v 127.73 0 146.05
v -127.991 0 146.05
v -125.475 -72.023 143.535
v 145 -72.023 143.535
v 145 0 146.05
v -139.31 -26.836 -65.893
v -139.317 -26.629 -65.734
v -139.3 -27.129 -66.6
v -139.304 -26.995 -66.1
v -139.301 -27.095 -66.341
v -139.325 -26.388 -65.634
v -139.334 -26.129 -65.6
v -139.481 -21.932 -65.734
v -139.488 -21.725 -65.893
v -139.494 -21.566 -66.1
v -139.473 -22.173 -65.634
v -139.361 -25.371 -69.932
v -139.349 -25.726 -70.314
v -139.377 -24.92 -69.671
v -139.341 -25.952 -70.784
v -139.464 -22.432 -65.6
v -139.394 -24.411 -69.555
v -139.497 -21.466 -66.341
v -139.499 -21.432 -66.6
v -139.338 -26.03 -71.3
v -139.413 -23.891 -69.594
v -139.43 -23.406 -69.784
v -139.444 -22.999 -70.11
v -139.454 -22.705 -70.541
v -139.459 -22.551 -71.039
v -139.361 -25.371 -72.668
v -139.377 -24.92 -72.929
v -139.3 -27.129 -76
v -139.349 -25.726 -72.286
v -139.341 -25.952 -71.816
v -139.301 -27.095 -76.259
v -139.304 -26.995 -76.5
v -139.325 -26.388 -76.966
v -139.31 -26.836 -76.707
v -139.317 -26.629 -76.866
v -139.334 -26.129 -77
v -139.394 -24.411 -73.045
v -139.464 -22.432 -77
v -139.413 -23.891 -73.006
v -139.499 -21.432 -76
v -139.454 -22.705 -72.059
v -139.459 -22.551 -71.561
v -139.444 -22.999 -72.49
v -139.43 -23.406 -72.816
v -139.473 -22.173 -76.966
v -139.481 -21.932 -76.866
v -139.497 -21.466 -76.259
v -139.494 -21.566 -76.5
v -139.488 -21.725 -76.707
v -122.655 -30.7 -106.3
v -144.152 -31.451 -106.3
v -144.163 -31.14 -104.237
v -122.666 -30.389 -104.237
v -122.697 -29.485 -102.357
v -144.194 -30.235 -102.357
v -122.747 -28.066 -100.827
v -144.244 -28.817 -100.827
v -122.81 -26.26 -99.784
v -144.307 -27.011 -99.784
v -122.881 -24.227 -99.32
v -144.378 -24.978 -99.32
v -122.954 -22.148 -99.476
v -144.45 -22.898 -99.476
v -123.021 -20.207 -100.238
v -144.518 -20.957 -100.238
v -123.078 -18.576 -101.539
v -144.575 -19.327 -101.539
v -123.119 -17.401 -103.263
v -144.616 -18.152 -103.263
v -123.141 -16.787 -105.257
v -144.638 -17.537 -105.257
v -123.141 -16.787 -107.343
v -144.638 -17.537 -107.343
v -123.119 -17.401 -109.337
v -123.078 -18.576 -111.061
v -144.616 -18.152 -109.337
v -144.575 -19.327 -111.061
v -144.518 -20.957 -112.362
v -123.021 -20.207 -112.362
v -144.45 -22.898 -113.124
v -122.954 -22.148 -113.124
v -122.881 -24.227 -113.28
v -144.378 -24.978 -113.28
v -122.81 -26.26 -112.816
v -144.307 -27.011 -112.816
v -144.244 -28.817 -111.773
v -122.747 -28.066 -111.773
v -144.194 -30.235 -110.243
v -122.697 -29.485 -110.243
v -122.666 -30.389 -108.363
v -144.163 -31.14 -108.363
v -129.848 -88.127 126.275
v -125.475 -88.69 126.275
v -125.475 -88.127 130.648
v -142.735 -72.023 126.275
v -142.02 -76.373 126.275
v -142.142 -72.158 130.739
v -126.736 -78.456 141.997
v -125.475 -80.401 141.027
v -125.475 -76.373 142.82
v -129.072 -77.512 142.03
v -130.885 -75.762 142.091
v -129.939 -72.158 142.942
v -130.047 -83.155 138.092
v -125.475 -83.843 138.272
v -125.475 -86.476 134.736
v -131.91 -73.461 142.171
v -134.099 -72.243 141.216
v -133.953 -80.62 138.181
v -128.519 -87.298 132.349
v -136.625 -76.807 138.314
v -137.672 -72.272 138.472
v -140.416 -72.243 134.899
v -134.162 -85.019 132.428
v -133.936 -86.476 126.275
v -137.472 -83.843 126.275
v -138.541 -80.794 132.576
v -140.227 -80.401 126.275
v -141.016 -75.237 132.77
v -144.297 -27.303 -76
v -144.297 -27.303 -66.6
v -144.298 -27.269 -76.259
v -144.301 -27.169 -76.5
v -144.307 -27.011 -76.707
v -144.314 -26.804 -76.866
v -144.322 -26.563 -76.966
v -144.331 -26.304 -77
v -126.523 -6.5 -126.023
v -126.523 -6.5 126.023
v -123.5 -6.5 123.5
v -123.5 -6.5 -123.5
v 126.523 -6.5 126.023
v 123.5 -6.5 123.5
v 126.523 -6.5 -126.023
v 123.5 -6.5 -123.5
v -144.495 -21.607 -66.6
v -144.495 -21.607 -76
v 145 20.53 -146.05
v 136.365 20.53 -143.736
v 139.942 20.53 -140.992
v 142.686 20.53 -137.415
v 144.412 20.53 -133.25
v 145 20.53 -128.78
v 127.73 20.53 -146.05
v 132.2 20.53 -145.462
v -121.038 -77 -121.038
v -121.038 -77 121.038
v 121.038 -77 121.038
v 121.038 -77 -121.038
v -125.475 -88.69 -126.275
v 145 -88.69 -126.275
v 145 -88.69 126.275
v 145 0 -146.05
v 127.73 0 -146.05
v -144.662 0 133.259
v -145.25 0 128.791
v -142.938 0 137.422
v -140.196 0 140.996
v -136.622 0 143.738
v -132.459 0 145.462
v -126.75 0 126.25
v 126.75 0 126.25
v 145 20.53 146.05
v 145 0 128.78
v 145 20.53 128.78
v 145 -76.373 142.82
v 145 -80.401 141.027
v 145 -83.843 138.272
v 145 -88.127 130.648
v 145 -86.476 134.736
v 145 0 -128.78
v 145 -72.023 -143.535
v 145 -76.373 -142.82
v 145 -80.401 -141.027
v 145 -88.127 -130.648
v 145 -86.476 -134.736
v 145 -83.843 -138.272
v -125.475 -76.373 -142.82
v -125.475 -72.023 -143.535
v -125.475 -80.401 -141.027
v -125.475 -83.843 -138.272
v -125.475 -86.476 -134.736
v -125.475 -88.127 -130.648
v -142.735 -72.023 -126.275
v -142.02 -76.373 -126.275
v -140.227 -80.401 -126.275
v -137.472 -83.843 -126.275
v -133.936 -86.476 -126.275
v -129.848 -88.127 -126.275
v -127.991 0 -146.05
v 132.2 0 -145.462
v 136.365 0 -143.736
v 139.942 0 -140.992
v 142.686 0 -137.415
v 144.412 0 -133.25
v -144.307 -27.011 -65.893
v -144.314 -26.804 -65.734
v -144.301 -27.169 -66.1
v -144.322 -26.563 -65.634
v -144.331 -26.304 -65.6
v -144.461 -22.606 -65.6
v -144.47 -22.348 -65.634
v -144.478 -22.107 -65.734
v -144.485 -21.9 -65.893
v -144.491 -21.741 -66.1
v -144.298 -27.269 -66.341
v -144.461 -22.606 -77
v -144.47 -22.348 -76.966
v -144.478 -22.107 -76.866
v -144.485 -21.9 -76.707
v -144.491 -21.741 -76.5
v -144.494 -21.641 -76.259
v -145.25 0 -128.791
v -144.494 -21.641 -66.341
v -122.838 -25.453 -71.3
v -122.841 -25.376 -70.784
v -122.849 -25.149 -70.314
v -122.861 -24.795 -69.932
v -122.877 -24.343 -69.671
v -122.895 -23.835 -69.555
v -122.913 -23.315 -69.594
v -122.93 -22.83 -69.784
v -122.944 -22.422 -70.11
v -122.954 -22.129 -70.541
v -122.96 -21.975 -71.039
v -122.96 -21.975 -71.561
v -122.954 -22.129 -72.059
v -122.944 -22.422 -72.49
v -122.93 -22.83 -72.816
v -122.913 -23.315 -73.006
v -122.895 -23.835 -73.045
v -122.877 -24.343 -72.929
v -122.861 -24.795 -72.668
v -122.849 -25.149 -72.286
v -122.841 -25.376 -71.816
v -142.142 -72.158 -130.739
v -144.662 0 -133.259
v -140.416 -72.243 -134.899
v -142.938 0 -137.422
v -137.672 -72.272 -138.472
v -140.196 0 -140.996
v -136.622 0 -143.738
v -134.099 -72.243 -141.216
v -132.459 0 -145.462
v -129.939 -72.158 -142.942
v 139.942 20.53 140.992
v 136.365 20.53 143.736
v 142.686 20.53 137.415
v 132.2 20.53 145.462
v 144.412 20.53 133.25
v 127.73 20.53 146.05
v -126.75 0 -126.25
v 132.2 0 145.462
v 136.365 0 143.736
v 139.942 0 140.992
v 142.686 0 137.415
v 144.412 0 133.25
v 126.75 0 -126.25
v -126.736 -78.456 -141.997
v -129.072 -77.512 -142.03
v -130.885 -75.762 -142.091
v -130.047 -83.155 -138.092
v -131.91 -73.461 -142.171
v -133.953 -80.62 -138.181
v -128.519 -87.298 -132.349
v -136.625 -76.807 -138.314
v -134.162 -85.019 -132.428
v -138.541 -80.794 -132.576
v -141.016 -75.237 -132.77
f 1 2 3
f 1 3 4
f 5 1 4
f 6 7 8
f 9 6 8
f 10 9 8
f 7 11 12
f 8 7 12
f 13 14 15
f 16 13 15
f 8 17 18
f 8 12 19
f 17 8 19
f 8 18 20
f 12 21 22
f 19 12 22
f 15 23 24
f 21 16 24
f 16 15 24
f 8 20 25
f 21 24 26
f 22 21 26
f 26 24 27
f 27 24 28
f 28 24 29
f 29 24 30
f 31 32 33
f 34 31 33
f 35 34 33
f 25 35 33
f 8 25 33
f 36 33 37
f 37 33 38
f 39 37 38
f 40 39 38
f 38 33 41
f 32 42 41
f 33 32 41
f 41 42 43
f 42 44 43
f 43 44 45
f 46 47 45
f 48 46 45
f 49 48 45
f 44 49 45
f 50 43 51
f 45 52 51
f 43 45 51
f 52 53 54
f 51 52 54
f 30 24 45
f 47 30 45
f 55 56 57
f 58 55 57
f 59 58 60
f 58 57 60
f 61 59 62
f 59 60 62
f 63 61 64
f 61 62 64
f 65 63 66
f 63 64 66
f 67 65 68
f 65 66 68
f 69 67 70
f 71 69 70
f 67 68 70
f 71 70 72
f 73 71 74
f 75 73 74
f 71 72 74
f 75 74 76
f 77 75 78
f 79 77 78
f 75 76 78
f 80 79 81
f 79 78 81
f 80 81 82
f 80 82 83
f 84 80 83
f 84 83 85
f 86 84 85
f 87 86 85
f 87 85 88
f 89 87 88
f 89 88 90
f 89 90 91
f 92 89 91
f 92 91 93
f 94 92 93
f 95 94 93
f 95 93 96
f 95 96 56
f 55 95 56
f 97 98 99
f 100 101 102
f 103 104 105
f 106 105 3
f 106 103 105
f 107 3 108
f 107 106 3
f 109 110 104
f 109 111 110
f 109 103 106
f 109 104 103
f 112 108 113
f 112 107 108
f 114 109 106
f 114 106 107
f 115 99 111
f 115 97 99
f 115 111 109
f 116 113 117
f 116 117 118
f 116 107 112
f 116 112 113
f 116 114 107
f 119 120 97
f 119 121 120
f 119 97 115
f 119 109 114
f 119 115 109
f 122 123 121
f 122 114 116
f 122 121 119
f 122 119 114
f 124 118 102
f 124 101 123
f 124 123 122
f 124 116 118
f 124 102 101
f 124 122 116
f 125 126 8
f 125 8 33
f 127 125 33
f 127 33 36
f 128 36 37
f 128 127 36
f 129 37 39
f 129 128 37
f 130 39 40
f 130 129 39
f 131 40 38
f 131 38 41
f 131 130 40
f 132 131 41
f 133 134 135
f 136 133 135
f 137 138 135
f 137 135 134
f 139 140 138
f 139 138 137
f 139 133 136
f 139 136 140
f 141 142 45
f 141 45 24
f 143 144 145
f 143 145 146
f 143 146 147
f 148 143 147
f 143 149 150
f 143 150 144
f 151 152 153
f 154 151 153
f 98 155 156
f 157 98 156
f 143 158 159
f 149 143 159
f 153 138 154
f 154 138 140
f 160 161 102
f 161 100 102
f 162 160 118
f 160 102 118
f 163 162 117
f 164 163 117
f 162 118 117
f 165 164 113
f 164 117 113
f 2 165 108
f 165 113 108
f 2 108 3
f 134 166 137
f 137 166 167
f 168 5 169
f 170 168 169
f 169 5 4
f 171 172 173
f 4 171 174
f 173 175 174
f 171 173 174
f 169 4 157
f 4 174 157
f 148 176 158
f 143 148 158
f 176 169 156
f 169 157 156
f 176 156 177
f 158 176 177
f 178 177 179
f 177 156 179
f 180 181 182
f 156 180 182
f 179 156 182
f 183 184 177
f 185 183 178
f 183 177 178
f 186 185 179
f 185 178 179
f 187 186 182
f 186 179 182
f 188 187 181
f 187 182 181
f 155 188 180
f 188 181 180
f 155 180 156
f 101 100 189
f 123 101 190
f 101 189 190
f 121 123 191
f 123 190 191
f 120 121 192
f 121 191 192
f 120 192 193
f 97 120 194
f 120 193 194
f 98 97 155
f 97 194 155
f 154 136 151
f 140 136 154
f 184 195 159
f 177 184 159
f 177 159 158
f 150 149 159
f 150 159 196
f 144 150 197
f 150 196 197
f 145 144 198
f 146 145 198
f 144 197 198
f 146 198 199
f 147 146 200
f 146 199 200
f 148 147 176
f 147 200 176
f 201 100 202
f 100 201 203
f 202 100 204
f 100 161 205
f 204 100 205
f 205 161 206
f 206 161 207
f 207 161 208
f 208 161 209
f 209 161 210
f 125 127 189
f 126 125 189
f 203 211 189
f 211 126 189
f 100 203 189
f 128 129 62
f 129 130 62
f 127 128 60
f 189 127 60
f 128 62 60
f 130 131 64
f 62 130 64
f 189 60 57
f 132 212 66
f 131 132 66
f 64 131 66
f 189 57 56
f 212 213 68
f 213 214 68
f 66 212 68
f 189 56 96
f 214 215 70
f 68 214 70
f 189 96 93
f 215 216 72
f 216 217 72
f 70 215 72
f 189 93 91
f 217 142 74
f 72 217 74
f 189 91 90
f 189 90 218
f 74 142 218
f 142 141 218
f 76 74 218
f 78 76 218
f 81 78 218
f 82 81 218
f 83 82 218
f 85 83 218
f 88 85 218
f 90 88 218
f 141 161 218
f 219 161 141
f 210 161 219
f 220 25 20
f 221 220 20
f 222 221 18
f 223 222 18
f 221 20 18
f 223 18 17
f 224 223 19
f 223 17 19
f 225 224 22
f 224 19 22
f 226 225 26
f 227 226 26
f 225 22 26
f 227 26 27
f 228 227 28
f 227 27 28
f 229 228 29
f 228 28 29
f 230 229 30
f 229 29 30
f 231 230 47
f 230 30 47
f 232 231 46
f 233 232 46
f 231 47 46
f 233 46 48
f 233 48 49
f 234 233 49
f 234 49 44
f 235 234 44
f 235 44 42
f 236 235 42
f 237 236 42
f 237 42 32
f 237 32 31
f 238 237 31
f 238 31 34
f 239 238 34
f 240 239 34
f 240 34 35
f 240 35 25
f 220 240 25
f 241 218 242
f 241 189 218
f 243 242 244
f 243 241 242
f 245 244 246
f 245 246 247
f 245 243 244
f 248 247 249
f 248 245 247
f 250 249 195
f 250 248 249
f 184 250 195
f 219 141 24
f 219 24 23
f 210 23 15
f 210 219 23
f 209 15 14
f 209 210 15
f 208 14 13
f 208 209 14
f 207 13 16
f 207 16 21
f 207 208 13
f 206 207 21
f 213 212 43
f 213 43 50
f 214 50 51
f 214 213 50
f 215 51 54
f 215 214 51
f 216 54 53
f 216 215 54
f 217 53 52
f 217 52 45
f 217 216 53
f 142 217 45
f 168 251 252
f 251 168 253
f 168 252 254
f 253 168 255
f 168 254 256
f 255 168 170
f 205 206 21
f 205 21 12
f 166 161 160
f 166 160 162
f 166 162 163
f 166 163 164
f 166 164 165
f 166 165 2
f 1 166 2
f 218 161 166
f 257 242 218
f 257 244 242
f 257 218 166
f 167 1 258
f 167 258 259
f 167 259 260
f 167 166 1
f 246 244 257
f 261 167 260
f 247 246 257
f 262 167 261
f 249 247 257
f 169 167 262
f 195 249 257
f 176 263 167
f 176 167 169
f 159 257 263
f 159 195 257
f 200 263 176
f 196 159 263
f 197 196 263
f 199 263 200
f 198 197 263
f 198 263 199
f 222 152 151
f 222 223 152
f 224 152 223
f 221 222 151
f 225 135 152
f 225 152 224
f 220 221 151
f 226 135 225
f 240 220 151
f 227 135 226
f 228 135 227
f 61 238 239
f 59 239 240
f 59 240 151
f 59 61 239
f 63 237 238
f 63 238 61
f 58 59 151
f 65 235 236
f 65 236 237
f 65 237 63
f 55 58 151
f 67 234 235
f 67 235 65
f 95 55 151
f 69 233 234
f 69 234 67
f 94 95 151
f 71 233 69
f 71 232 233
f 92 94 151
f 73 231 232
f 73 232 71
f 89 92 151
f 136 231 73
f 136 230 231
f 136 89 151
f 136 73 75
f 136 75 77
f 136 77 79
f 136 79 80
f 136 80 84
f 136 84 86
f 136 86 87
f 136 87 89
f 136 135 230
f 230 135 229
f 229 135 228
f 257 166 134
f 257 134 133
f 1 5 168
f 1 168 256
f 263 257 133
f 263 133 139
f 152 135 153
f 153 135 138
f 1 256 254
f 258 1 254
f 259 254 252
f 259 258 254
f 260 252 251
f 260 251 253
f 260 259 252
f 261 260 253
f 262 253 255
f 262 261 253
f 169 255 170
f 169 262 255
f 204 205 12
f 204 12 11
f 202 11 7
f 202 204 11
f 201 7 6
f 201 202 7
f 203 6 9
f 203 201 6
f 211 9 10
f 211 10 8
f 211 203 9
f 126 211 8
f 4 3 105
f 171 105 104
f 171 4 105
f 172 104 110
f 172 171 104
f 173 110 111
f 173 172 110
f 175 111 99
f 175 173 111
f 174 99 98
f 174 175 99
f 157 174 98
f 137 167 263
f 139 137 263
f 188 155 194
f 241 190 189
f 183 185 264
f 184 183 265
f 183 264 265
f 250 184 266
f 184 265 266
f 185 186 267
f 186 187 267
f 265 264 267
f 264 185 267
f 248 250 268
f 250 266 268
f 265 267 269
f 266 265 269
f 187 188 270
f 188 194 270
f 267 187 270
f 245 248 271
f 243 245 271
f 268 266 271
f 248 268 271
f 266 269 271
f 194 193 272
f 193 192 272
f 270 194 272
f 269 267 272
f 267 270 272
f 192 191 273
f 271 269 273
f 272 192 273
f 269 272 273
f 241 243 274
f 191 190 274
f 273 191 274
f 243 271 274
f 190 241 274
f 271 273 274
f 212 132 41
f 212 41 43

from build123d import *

# Parameters (mm, degrees)
SKETCH1_W               = 295
SKETCH1_H               = 292.1
BOSS_EXTRUDE1_DEPTH     = 88.69
BOSS_EXTRUDE1_DRAFT     = -2
SKETCH3_W               = 253.5
SKETCH3_H               = 252.5
CUT_EXTRUDE3_DEPTH      = 6.5
CUT_EXTRUDE3_DRAFT      = -2
SKETCH5_W               = 247
SKETCH5_H               = 247
CUT_EXTRUDE4_DEPTH      = 70.5
CUT_EXTRUDE4_DRAFT      = -2
CUT_EXTRUDE5_DEPTH      = 228.203831614
CUT_EXTRUDE5_DEPTH_BACK = 228.203831614
FILLET2_R               = 17.27
BOSS_EXTRUDE2_DEPTH     = 20.53
CUT_EXTRUDE6_REACH      = 337.359
SKETCH8_R               = 7
CUT_EXTRUDE7_DEPTH      = 5
CUT_EXTRUDE8_REACH      = 333.091
SKETCH9_R               = 1.75


with BuildPart() as part:
    # Sketch1 → Boss-Extrude1 (with draft: the straight prism first)
    with BuildSketch(Plane(origin=(0, 0, 0), x_dir=(1, 0, 0), z_dir=(0, 1, 0))):
        with Locations((2.25, 0)):
            Rectangle(SKETCH1_W, SKETCH1_H)
    extrude(amount=-BOSS_EXTRUDE1_DEPTH)
    # Boss-Extrude1: the draft: its side faces are tilted about the plane it starts from
    boss_extrude1_sides = [part.faces().sort_by_distance(p)[0] for p in [
        (2.25, -44.345, 146.05),
        (149.75, -44.345, 0),
        (2.25, -44.345, -146.05),
        (-145.25, -44.345, 0),
    ]]
    draft(boss_extrude1_sides, Plane(origin=(0, 0, 0), x_dir=(1, 0, 0), z_dir=(0, 1, 0)), BOSS_EXTRUDE1_DRAFT)


with BuildPart() as cut_extrude3_tool:
    # Sketch3 → Cut-Extrude3 (with draft: the straight prism first)
    with BuildSketch(Plane(origin=(0, 0, 0), x_dir=(1, 0, 0), z_dir=(0, 1, 0))):
        Rectangle(SKETCH3_W, SKETCH3_H)
    extrude(amount=-CUT_EXTRUDE3_DEPTH)
    # Cut-Extrude3: the draft: its side faces are tilted about the plane it starts from
    cut_extrude3_sides = [cut_extrude3_tool.faces().sort_by_distance(p)[0] for p in [
        (0, -3.25, 126.25),
        (126.75, -3.25, 0),
        (0, -3.25, -126.25),
        (-126.75, -3.25, 0),
    ]]
    draft(cut_extrude3_sides, Plane(origin=(0, 0, 0), x_dir=(1, 0, 0), z_dir=(0, 1, 0)), CUT_EXTRUDE3_DRAFT)


with BuildPart() as part_1:
    add(part.part)

    # Cut-Extrude3: cut by cut_extrude3_tool
    add(cut_extrude3_tool.part, mode=Mode.SUBTRACT)


with BuildPart() as cut_extrude4_tool:
    # Sketch5 → Cut-Extrude4 (with draft: the straight prism first)
    with BuildSketch(Plane(origin=(0, -6.5, 0), x_dir=(1, 0, 0), z_dir=(0, 1, 0))):
        Rectangle(SKETCH5_W, SKETCH5_H)
    extrude(amount=-CUT_EXTRUDE4_DEPTH)
    # Cut-Extrude4: the draft: its side faces are tilted about the plane it starts from
    cut_extrude4_sides = [cut_extrude4_tool.faces().sort_by_distance(p)[0] for p in [
        (0, -41.75, 123.5),
        (123.5, -41.75, 0),
        (0, -41.75, -123.5),
        (-123.5, -41.75, 0),
    ]]
    draft(cut_extrude4_sides, Plane(origin=(0, -6.5, 0), x_dir=(1, 0, 0), z_dir=(0, 1, 0)), CUT_EXTRUDE4_DRAFT)


with BuildPart() as part_2:
    add(part_1.part)

    # Cut-Extrude4: cut by cut_extrude4_tool
    add(cut_extrude4_tool.part, mode=Mode.SUBTRACT)

    # Sketch6 → Cut-Extrude5 (cut, two sides: drawn at the far end of the back side and taken through both)
    with BuildSketch(Plane.XY.offset(-CUT_EXTRUDE5_DEPTH_BACK)):
        Polygon((149.75, 0), (145, 0), (145, -88.69), (146.652876954, -88.69), align=None)
    extrude(amount=CUT_EXTRUDE5_DEPTH + CUT_EXTRUDE5_DEPTH_BACK, mode=Mode.SUBTRACT)

    # Fillet2
    fillet2_edges = [part_2.edges().sort_by_distance(p)[0] for p in [
        (1.423561523, -88.69, -142.952876954),
        (-143.701438477, -44.345, -144.501438477),
        (-142.152876954, -88.69, 0),
        (-143.701438477, -44.345, 144.501438477),
        (1.423561523, -88.69, 142.952876954),
    ]]
    fillet(fillet2_edges, radius=FILLET2_R)

    # Sketch7 → Boss-Extrude2 (add)
    with BuildSketch(Plane(origin=(0, 0, 0), x_dir=(1, 0, 0), z_dir=(0, 1, 0))):
        with BuildLine():
            Line((145, 128.78), (145, 146.05))
            Line((145, 146.05), (127.73, 146.05))
            ThreePointArc((127.73, 146.05), (139.941734111, 140.991734111), (145, 128.78))
        make_face()
        with BuildLine():
            Line((145, -146.05), (127.73, -146.05))
            ThreePointArc((127.73, -146.05), (139.941734111, -140.991734111), (145, -128.78))
            Line((145, -128.78), (145, -146.05))
        make_face()
    extrude(amount=BOSS_EXTRUDE2_DEPTH)

    # Sketch8 → Cut-Extrude6 (cut, up to next)
    with BuildSketch(Plane(origin=(-145.07308915, -5.066063906, 0), x_dir=(0, 0, 1), z_dir=(-0.9993908270190958, -0.03489949670250105, 0)), mode=Mode.PRIVATE) as cut_extrude6_sk1:
        with Locations((-106.3, -19.400848104)):
            Circle(SKETCH8_R)
    cut_extrude6_tool1 = extrude(cut_extrude6_sk1.sketch, amount=-CUT_EXTRUDE6_REACH, mode=Mode.PRIVATE) & part_2.part
    add(cut_extrude6_tool1.solids().sort_by_distance((-144.396009, -24.455094, -106.3))[0], mode=Mode.SUBTRACT)

    # Sketch8<3> → Cut-Extrude7 (cut)
    with BuildSketch(Plane(origin=(-145.07308915, -5.066063906, 0), x_dir=(0, 0, 1), z_dir=(-0.9993908270190958, -0.03489949670250105, 0))):
        with BuildLine():
            ThreePointArc((-77, -21.250848104), (-76.707106781, -21.957954885), (-76, -22.250848104))
            Line((-76, -22.250848104), (-66.6, -22.250848104))
            ThreePointArc((-66.6, -22.250848104), (-65.892893219, -21.957954885), (-65.6, -21.250848104))
            Line((-65.6, -21.250848104), (-65.6, -17.550848104))
            ThreePointArc((-65.6, -17.550848104), (-65.892893219, -16.843741323), (-66.6, -16.550848104))
            Line((-66.6, -16.550848104), (-76, -16.550848104))
            ThreePointArc((-76, -16.550848104), (-76.707106781, -16.843741323), (-77, -17.550848104))
            Line((-77, -17.550848104), (-77, -21.250848104))
        make_face()
    extrude(amount=-CUT_EXTRUDE7_DEPTH, mode=Mode.SUBTRACT)

    # Sketch9 → Cut-Extrude8 (cut, up to next)
    with BuildSketch(Plane(origin=(-140.076135015, -4.891566422, 0), x_dir=(0, 0, 1), z_dir=(-0.9993908270190958, -0.03489949670250113, 0)), mode=Mode.PRIVATE) as cut_extrude8_sk1:
        with Locations((-71.3, -19.400848104)):
            Circle(SKETCH9_R)
    cut_extrude8_tool1 = extrude(cut_extrude8_sk1.sketch, amount=-CUT_EXTRUDE8_REACH, mode=Mode.PRIVATE) & part_2.part
    add(cut_extrude8_tool1.solids().sort_by_distance((-139.399055, -24.280596, -71.3))[0], mode=Mode.SUBTRACT)


solid = part_2.part
